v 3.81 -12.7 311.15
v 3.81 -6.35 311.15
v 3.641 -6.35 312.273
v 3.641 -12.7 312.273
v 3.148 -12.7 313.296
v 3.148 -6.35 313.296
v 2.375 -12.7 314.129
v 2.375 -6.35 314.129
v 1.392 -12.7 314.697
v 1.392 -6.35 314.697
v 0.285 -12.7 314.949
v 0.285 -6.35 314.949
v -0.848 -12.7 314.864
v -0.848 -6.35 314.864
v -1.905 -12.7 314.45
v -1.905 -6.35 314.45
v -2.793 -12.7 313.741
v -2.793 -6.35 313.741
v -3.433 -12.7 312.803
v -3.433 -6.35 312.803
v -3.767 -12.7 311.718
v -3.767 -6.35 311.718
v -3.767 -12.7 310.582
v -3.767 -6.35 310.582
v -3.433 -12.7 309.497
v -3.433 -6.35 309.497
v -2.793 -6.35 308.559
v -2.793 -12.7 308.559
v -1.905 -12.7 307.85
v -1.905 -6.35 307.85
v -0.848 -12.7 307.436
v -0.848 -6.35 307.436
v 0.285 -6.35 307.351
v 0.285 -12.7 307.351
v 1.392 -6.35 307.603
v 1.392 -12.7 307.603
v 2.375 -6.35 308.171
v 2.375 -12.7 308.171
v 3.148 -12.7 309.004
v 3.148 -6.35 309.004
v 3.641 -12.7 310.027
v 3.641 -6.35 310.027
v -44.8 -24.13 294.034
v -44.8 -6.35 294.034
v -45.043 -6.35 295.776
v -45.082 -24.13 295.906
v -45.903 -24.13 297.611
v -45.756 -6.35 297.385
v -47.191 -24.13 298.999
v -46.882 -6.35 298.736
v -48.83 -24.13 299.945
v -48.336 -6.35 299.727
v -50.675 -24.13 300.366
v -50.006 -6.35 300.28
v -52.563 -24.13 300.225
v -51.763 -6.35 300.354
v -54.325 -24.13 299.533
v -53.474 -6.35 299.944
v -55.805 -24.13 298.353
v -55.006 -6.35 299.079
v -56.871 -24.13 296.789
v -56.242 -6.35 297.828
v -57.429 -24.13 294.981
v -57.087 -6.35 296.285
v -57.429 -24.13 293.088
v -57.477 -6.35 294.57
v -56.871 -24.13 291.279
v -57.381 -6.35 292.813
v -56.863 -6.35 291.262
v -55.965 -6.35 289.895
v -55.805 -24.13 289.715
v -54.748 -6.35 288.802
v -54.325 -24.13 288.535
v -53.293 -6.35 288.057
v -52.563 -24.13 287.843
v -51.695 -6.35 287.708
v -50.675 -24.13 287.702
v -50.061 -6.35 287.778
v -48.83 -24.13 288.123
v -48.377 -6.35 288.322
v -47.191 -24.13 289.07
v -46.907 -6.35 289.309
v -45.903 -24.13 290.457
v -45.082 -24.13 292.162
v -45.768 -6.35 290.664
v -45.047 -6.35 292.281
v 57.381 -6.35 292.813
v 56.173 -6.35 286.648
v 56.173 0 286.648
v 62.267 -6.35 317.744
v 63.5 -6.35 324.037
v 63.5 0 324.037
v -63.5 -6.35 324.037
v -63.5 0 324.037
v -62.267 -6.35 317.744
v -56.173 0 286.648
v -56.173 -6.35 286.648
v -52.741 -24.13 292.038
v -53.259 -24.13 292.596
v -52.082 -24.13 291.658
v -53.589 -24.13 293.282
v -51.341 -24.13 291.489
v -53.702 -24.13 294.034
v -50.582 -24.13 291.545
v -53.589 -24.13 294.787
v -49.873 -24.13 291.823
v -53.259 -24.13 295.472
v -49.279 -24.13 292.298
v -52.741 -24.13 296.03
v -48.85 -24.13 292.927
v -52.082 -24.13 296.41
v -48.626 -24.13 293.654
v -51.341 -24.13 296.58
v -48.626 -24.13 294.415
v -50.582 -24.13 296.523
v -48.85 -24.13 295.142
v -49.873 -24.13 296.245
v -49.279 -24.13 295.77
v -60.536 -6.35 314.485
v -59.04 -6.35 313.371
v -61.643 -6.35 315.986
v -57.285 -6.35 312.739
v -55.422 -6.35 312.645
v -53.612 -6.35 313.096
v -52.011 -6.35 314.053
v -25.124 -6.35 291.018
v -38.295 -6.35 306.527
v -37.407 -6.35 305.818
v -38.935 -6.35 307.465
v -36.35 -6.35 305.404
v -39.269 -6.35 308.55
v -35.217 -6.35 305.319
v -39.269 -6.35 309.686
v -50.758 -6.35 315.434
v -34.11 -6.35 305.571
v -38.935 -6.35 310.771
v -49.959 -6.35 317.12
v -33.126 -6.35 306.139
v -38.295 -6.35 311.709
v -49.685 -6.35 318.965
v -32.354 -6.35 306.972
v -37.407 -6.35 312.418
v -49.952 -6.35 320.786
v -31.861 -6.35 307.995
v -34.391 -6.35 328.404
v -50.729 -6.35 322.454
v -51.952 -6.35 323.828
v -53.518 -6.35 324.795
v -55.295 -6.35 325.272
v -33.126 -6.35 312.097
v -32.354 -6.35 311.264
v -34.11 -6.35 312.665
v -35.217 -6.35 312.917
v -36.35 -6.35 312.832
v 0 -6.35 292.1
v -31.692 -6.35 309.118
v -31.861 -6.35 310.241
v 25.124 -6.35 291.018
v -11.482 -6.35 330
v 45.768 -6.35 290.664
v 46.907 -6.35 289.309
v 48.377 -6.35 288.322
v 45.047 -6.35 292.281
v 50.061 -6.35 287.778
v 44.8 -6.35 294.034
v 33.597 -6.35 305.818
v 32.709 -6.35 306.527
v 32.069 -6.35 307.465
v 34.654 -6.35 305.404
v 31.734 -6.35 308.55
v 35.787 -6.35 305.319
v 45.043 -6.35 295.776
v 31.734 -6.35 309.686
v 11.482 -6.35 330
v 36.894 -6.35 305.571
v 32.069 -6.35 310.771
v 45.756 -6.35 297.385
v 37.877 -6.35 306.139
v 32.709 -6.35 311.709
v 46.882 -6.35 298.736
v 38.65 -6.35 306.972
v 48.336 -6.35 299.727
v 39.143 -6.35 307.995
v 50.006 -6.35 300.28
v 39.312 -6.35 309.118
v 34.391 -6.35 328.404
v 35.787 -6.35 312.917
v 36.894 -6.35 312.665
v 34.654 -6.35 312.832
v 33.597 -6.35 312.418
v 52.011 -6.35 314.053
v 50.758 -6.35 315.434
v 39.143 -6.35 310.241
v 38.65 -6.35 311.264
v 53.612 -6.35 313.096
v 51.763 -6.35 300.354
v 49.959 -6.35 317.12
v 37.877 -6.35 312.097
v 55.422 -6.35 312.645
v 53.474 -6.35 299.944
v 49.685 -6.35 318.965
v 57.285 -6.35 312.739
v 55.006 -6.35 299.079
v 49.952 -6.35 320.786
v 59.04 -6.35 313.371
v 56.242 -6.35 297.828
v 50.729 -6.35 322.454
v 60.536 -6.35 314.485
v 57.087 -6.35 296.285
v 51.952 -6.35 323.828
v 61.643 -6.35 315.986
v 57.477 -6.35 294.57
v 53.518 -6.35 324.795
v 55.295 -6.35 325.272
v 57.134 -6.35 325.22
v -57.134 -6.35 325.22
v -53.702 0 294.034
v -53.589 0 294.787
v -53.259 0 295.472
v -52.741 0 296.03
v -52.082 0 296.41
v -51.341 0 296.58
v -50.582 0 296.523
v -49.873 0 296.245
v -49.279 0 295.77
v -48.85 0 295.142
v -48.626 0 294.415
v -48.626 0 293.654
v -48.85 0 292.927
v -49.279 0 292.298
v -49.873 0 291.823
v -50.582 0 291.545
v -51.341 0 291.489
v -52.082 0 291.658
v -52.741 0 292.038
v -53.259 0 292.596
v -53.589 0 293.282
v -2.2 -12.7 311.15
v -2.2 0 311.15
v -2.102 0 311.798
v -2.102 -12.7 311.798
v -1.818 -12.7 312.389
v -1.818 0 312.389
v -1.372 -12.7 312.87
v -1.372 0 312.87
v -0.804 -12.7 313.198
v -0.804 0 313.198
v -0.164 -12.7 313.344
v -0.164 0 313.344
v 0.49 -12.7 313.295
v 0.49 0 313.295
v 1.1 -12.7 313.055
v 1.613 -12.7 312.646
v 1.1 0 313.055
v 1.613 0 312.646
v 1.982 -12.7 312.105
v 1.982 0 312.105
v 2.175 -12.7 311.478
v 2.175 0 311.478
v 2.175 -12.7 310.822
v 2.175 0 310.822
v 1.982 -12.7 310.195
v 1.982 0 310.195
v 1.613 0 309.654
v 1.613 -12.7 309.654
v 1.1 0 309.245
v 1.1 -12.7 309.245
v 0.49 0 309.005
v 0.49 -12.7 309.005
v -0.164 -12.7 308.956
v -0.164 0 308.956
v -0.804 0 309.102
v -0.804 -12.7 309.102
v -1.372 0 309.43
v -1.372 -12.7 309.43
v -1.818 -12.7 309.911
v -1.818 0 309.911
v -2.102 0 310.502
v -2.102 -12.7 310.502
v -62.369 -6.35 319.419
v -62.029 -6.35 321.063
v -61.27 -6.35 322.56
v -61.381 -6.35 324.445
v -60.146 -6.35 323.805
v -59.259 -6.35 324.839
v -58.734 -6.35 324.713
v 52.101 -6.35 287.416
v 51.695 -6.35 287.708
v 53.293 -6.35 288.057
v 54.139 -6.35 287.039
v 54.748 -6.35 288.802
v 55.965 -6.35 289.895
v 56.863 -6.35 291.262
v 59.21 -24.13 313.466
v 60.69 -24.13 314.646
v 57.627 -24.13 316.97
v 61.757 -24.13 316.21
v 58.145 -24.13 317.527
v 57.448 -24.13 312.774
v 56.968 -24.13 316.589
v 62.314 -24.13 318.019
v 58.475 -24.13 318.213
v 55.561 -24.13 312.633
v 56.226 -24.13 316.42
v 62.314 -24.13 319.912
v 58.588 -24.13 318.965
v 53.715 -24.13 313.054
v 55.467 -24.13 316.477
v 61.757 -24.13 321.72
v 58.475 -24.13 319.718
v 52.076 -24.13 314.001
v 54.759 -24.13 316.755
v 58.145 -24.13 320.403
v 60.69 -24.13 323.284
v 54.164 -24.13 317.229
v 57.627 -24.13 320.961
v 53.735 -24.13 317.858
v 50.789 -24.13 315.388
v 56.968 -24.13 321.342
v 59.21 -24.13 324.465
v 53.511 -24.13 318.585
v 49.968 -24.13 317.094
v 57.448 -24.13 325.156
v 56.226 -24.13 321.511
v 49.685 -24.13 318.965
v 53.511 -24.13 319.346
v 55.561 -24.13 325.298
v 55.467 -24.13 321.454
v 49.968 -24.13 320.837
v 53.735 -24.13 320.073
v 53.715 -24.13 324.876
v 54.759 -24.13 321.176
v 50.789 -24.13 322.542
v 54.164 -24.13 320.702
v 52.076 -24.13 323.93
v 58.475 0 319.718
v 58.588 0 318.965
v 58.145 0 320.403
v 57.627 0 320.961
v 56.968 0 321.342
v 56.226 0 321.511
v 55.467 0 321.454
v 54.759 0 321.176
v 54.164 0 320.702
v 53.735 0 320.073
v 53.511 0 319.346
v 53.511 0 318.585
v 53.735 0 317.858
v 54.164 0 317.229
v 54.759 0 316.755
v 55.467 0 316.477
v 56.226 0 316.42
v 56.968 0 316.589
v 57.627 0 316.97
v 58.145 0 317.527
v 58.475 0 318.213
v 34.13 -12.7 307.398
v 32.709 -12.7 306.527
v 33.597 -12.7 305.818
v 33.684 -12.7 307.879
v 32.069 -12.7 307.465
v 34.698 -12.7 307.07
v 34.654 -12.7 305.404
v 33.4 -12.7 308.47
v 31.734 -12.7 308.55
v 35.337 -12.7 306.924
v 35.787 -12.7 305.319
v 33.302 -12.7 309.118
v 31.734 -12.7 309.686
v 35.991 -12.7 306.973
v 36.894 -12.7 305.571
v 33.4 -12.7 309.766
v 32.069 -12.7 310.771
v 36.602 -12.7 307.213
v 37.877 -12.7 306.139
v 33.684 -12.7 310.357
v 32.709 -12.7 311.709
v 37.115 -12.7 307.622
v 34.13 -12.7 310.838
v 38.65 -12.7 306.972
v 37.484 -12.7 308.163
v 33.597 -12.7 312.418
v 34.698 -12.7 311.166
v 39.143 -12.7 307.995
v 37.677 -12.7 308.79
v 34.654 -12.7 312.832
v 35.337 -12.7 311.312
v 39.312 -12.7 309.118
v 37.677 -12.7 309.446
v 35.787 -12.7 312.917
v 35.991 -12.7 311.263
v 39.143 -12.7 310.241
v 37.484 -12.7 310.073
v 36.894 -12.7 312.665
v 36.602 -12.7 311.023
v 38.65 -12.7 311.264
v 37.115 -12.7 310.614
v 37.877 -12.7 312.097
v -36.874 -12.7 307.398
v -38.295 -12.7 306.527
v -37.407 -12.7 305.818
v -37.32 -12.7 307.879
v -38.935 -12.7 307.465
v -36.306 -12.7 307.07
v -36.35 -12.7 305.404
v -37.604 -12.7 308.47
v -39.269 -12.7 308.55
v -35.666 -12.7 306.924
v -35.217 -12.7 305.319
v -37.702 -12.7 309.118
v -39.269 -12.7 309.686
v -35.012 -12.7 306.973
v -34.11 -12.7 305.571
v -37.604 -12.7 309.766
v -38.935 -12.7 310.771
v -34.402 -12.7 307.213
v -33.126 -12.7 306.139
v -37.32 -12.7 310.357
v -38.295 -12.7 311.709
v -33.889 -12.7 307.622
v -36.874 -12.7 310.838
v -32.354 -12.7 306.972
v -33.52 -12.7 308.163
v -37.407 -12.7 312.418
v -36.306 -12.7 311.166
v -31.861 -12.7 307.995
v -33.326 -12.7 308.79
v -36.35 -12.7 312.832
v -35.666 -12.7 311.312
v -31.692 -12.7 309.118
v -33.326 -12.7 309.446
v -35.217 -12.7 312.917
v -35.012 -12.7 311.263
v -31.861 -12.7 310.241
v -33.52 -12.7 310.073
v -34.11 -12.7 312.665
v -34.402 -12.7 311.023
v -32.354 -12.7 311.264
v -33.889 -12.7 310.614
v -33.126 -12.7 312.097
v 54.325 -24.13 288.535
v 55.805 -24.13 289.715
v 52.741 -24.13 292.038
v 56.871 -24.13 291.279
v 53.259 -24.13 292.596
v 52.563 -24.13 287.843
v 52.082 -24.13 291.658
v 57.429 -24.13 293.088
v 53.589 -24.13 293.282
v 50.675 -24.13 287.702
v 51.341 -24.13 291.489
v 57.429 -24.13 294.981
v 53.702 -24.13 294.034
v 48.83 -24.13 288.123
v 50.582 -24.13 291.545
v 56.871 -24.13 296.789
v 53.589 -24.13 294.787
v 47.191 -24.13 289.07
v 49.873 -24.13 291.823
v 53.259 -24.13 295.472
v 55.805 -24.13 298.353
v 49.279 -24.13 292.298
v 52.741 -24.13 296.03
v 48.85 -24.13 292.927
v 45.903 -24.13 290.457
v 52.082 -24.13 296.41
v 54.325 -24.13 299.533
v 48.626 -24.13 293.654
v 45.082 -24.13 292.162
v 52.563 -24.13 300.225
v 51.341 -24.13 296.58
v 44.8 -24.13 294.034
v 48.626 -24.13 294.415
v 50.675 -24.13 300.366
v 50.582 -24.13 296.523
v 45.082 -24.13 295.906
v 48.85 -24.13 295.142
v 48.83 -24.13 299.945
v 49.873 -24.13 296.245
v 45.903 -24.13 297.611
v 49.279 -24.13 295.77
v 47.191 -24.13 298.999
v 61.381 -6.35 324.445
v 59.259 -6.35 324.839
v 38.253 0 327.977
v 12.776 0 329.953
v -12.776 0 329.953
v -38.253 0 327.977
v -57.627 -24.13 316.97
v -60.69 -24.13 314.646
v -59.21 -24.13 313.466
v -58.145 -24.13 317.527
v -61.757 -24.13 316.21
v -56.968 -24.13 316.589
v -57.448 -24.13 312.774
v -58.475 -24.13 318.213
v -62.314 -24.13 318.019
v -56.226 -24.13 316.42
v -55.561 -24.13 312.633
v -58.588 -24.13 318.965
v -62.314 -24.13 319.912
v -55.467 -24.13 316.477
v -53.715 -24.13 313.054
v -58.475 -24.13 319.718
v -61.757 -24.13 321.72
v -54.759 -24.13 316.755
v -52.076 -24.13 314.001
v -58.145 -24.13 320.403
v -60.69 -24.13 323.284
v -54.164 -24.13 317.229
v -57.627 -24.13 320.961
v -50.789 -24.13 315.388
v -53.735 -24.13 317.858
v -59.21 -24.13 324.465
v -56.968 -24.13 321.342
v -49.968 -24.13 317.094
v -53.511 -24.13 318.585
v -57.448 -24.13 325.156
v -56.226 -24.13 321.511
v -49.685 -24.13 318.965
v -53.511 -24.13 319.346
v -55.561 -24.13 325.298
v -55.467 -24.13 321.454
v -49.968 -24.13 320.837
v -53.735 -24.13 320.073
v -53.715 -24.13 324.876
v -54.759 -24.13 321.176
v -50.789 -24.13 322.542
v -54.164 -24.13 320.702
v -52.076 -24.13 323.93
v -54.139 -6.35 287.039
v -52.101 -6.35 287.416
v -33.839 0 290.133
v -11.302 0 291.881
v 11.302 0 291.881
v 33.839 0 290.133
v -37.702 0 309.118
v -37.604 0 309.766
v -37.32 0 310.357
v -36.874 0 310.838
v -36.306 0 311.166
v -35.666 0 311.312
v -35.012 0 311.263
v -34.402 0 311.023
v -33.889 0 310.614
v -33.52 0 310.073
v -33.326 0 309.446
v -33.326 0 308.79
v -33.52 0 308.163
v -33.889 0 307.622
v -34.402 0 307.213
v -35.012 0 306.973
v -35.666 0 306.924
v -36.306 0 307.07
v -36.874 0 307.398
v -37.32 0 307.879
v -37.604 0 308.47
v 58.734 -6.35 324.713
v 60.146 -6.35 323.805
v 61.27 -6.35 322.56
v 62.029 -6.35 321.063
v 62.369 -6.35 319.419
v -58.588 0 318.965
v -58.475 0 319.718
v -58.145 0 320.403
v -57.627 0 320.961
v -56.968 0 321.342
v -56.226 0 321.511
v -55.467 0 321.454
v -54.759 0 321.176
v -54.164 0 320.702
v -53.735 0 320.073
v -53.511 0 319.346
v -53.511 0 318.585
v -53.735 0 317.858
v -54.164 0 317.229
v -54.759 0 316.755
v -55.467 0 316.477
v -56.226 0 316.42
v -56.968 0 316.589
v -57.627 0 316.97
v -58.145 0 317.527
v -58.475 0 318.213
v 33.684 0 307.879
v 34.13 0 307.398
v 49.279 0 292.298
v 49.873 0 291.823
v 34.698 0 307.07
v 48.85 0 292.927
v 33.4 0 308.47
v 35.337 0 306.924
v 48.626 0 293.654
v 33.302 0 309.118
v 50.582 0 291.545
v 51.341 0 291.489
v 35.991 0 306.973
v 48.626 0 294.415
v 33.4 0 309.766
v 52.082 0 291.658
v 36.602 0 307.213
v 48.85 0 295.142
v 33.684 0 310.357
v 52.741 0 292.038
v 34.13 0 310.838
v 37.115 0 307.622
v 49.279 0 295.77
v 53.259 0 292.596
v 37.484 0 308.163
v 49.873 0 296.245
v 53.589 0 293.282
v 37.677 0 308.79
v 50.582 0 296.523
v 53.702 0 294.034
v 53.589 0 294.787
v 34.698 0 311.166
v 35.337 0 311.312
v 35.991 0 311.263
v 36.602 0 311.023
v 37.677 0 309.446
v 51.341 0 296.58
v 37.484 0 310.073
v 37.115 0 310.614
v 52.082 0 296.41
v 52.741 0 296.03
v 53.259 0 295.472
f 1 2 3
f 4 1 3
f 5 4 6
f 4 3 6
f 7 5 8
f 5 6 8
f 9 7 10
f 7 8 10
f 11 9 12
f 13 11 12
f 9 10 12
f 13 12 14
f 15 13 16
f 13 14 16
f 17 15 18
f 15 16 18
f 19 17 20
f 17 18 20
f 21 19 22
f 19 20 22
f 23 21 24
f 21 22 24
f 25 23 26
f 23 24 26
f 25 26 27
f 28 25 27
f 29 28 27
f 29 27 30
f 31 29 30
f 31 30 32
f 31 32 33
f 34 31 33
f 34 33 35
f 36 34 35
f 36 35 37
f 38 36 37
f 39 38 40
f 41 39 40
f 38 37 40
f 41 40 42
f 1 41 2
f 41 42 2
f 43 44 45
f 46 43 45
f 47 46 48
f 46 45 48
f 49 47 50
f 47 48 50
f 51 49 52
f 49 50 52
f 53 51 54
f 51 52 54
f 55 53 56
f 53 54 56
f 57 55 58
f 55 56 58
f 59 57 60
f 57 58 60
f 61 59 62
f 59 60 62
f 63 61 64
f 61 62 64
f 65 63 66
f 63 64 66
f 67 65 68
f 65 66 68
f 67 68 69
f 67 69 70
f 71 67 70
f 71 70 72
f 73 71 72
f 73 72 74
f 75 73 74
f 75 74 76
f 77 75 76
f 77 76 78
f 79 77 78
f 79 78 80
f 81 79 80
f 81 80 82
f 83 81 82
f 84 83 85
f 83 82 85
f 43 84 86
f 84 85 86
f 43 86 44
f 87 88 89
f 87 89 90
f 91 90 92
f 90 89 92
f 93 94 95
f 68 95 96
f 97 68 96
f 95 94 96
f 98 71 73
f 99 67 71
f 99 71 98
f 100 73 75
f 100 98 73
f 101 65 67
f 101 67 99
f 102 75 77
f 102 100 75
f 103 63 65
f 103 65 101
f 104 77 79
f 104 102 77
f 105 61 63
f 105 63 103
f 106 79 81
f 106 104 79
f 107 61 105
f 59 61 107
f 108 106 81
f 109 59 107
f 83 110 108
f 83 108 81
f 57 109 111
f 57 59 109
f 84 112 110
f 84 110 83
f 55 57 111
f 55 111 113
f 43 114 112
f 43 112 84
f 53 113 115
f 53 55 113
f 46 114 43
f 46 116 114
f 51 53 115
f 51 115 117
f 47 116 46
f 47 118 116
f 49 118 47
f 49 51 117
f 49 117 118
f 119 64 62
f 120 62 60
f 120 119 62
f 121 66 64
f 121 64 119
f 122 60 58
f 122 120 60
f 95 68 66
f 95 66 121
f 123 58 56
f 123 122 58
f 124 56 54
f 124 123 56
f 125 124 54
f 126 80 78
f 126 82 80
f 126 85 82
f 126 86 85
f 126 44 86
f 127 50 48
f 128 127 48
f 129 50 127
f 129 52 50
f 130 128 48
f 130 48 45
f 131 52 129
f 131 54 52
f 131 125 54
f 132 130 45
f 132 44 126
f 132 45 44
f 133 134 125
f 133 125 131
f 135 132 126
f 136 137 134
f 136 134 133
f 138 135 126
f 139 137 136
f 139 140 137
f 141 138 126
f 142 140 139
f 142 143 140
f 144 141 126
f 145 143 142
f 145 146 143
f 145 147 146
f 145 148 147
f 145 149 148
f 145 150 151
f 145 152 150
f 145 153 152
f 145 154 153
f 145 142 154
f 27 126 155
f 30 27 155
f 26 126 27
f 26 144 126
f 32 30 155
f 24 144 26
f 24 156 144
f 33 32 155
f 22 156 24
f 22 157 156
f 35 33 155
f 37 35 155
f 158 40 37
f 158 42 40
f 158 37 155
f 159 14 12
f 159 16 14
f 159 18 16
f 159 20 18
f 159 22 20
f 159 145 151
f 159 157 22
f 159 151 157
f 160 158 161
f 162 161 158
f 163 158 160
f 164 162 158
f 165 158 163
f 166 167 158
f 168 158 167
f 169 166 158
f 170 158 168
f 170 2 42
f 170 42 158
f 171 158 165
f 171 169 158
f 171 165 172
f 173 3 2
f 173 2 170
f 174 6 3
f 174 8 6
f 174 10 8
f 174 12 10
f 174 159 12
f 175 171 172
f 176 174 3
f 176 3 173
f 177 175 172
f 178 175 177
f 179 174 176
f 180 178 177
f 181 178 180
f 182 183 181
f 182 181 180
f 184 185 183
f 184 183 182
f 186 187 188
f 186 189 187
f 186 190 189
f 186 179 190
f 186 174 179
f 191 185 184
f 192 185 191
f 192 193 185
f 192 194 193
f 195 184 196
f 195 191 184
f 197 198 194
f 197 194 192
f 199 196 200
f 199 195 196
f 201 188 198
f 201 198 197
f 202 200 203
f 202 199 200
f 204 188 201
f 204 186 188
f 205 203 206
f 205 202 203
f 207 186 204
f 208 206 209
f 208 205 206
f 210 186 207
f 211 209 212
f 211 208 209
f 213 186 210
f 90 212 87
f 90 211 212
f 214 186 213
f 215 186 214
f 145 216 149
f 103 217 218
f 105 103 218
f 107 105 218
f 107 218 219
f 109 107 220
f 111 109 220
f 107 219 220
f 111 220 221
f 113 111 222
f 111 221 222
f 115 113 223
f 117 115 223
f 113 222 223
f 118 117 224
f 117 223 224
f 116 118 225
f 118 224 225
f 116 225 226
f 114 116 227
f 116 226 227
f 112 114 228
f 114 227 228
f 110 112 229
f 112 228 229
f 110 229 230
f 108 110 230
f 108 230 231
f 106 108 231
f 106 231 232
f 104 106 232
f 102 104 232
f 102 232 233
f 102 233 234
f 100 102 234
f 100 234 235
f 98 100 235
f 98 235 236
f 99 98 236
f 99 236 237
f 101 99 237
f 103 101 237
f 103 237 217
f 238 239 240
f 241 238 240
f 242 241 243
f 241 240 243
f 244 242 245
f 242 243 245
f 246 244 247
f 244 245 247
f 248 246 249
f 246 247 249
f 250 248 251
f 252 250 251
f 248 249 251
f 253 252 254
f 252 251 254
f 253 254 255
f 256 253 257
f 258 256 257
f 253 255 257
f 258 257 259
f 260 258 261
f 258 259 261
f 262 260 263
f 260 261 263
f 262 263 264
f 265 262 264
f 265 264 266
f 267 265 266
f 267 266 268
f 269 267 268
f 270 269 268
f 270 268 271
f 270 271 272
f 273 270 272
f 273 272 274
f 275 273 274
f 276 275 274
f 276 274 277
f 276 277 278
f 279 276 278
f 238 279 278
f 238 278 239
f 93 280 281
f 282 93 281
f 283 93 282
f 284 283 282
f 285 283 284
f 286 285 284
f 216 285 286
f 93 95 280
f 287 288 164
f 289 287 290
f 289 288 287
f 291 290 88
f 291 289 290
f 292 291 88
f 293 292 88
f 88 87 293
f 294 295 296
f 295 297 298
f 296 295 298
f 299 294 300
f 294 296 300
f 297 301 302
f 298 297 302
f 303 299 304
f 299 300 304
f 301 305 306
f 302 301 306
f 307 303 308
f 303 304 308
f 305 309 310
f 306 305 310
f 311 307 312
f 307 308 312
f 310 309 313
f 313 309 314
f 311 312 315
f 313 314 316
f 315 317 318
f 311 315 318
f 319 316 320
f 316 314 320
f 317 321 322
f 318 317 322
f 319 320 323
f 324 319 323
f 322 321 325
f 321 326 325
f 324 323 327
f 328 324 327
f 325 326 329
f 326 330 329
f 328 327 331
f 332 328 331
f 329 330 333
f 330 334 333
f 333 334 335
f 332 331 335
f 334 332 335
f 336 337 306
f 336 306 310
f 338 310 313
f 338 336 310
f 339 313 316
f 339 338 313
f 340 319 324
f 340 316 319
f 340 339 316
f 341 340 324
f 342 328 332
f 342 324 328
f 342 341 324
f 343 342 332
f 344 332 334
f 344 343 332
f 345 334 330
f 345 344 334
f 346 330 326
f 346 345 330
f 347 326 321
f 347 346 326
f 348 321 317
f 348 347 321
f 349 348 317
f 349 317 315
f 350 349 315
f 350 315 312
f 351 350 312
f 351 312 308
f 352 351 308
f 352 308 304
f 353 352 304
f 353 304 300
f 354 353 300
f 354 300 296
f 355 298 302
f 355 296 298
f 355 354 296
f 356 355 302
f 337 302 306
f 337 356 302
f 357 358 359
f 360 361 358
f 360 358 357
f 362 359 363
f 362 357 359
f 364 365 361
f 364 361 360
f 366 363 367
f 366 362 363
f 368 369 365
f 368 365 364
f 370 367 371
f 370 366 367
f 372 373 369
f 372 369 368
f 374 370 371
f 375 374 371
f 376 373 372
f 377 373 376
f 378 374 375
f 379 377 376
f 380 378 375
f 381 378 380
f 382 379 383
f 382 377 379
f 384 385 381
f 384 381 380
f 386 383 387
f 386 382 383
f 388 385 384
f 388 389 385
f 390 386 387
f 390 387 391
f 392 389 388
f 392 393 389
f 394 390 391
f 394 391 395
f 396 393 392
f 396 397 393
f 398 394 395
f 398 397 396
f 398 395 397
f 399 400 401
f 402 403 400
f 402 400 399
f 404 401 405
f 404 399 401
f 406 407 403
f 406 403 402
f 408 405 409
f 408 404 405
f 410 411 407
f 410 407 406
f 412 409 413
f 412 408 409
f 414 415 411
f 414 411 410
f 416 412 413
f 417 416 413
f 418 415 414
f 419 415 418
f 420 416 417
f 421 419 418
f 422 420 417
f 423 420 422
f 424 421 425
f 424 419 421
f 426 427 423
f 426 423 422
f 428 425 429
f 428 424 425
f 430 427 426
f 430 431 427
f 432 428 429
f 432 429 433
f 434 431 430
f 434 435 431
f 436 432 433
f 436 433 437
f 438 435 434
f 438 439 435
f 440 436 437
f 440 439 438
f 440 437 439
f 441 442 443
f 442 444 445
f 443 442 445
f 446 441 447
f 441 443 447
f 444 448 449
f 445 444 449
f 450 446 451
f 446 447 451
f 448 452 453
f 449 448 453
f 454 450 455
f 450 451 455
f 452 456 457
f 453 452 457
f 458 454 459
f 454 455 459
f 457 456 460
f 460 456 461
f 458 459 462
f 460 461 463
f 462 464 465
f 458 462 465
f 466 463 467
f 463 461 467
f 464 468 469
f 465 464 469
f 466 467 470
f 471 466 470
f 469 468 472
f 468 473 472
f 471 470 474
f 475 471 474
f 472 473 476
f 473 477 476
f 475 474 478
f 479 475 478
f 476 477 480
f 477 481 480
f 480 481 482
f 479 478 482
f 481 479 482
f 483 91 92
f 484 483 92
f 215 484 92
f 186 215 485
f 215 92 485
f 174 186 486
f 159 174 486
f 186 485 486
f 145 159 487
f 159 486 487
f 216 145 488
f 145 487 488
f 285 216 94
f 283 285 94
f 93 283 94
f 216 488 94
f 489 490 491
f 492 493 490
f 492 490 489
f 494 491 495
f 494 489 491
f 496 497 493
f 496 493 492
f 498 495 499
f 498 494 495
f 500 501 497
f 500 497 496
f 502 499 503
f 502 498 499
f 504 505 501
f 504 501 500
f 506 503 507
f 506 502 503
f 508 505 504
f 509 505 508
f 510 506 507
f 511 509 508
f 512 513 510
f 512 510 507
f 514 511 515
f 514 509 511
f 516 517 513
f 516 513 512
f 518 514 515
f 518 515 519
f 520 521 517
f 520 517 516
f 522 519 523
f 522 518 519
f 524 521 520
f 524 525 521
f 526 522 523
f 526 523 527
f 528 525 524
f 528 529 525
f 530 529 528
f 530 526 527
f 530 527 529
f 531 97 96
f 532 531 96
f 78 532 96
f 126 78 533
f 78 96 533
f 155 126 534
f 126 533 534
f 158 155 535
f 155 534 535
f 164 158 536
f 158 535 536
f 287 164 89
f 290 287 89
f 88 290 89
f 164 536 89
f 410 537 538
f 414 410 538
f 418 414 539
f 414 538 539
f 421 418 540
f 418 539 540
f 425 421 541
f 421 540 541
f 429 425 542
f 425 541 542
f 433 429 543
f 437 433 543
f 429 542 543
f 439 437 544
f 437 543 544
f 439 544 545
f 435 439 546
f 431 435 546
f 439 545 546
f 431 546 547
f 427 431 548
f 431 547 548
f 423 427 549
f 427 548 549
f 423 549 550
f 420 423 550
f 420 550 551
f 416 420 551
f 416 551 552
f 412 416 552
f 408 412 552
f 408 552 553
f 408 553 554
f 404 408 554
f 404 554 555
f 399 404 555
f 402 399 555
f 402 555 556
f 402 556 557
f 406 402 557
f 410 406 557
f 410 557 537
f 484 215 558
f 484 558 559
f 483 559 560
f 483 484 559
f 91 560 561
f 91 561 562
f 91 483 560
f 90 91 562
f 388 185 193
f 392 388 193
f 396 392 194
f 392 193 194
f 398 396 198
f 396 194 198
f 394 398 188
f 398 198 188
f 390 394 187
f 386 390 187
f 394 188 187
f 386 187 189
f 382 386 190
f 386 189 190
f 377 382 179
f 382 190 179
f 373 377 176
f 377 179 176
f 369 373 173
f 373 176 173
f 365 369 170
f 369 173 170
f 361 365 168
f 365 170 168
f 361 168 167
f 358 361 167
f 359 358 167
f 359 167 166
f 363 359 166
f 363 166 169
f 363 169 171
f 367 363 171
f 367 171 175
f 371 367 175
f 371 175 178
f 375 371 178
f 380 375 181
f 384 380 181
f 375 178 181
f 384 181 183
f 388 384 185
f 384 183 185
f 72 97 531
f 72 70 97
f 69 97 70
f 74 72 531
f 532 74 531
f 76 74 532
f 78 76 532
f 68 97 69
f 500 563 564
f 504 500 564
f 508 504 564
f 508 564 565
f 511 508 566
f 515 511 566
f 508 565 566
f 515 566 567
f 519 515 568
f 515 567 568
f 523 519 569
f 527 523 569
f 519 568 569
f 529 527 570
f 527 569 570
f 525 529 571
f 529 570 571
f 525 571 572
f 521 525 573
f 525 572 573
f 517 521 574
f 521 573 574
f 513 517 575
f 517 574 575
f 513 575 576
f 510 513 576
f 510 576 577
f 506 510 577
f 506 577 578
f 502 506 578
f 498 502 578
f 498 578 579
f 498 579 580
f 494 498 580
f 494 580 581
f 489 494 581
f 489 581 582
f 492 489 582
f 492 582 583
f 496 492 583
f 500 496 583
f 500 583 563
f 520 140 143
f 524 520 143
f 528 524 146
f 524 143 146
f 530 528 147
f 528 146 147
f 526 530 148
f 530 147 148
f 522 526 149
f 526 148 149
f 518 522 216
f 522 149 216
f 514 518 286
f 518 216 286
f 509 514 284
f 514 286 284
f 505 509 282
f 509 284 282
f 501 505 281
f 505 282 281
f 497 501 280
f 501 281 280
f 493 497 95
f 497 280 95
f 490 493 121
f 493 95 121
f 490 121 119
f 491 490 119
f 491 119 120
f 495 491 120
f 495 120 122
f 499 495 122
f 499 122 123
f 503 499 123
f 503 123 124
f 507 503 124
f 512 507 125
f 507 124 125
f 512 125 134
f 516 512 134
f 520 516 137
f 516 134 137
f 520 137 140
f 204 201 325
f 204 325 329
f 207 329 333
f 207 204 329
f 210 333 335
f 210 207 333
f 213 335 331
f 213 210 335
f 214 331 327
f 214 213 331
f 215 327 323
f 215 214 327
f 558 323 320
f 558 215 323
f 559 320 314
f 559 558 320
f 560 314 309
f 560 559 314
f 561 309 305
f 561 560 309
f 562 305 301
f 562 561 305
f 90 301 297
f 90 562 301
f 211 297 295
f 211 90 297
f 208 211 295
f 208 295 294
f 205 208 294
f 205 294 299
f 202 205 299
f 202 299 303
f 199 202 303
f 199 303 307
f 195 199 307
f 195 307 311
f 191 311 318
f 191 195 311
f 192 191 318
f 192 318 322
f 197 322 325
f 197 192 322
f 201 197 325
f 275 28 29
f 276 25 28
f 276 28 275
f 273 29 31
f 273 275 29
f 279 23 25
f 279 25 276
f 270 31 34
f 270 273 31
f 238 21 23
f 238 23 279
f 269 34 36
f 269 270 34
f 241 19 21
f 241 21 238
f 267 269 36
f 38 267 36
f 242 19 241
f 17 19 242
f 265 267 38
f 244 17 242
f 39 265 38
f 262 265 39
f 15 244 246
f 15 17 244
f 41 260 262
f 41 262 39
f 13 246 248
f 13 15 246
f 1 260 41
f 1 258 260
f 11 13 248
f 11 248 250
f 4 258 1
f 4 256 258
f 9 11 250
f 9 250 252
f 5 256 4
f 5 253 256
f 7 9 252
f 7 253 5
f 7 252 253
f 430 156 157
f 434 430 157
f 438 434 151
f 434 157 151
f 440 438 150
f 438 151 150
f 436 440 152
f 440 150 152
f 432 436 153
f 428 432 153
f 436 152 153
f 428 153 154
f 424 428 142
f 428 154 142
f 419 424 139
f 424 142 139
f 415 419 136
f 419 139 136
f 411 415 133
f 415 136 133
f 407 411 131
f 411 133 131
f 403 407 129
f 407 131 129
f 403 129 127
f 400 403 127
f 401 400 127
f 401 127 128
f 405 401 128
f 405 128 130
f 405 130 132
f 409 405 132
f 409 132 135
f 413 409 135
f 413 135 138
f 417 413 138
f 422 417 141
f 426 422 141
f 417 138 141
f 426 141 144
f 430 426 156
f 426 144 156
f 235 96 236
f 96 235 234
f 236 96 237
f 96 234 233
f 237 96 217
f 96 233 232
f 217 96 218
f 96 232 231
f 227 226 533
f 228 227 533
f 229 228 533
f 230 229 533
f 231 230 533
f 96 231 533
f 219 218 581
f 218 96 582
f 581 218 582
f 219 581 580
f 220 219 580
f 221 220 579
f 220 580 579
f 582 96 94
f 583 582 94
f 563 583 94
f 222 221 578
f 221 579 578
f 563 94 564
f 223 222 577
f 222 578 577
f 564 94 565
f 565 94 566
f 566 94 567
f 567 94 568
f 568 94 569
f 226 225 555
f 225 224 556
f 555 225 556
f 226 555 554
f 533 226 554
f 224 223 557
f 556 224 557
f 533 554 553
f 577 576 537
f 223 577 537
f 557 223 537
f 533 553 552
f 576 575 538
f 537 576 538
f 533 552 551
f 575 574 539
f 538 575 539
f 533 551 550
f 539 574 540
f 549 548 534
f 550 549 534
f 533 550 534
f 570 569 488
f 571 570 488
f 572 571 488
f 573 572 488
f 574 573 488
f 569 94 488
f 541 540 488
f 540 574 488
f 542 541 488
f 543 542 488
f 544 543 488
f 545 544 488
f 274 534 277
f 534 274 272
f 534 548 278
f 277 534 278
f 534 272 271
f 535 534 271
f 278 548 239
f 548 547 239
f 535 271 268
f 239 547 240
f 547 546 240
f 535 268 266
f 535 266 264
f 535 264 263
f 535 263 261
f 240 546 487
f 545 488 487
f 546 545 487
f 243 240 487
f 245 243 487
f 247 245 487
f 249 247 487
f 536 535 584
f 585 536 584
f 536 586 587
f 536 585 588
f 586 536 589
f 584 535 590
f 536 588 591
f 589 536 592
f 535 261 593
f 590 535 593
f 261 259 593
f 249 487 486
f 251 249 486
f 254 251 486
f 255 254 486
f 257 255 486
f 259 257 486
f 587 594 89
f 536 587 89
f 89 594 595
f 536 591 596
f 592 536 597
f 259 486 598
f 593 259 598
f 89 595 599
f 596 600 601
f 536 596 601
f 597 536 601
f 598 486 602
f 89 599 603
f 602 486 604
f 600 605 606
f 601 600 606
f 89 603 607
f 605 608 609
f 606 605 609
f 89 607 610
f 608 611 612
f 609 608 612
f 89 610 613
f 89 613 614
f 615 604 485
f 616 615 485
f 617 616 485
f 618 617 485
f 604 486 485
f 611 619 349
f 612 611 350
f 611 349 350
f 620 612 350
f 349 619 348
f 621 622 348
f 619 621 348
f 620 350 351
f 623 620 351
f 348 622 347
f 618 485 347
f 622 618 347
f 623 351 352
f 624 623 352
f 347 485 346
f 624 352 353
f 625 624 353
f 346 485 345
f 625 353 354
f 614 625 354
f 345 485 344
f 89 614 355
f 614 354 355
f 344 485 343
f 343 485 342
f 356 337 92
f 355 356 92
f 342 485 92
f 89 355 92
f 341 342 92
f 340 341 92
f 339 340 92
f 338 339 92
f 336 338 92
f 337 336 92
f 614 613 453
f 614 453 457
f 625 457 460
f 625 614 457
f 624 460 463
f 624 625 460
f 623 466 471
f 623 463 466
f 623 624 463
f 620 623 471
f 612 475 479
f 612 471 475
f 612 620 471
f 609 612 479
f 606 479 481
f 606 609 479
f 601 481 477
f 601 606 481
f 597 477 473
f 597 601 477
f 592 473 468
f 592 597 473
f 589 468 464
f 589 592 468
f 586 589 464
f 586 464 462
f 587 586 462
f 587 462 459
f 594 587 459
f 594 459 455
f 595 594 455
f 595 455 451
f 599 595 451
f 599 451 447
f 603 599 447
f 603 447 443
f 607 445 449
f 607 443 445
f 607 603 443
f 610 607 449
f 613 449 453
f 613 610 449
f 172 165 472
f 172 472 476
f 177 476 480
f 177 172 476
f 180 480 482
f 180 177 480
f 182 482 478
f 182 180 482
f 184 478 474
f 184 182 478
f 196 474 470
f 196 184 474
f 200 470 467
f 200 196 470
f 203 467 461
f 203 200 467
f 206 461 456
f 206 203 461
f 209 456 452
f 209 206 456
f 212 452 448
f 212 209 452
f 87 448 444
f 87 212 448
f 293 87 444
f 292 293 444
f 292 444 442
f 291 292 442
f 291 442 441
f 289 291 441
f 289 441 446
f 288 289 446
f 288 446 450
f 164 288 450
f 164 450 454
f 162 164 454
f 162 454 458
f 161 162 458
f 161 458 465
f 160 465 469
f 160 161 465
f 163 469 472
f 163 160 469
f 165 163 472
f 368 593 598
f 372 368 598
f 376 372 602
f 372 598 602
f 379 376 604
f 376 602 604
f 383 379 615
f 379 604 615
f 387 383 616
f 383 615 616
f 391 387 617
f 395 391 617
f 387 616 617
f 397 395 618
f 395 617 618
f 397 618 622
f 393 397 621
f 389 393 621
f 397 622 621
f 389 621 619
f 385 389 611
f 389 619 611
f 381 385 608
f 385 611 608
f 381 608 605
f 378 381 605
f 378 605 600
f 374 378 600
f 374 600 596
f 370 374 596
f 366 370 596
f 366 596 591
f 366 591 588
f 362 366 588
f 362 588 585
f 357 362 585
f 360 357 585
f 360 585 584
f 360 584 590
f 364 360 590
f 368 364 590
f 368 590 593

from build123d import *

# Parameters (mm, degrees)
F1_DEPTH = 6.35
F2_R     = 6.35
F3_DEPTH = 17.78
F5_D     = 5.1054
F6_R     = 3.81
F7_DEPTH = 6.35
F9_D     = 4.4


# Not quite as in the source:
# - a pattern or mirror of a feature is missing from the dataset's text; its kind, count and spacing are read off the source's solid


with BuildPart() as f1:
    # F0 (on Front) → F1 (new body)
    with BuildSketch(Plane.XZ):
        with BuildLine():
            Line((56.1730769231, 286.6478596274), (63.5, 324.0367108832))
            ThreePointArc((63.5, 324.0367108832), (0, 330.2), (-63.5, 324.0367108832))
            Line((-63.5, 324.0367108832), (-56.1730769231, 286.6478596274))
            ThreePointArc((-56.1730769231, 286.6478596274), (0, 292.1), (56.1730769231, 286.6478596274))
        make_face()
    extrude(amount=F1_DEPTH)

    # F2 (on face) → F3 (join)
    with BuildSketch(Plane.XZ.offset(6.35)):
        with Locations((-51.149763091, 294.0341888892)):
            Circle(F2_R)
        with Locations((-56.0353976971, 318.9652907527)):
            Circle(F2_R)
    f3 = extrude(amount=F3_DEPTH)

    # F3_copies: F3 across plane
    add(f3.mirror(Plane(origin=(0, 0, 0), x_dir=(0, 0, 1), z_dir=(1, 0, 0))))

    # F5 (through all)
    with Locations(Plane.XZ.offset(24.13)):
        with Locations((-56.0353976971, 318.9652907527), (-51.149763091, 294.0341888892)):
            f5 = Hole(F5_D / 2)

    # F5_copies: F5 across plane
    add(f5.mirror(Plane(origin=(0, 0, 0), x_dir=(0, 0, 1), z_dir=(1, 0, 0))), mode=Mode.SUBTRACT)

    # F6 (on face) → F7 (join)
    with BuildSketch(Plane.XZ.offset(6.35)):
        with Locations((0, 311.15)):
            Circle(F6_R)
        with Locations((-35.501895386, 309.118)):
            Circle(F6_R)
        with Locations((35.501895386, 309.118)):
            Circle(F6_R)
    extrude(amount=F7_DEPTH)

    # F9 (through all)
    with Locations(Plane.XZ.offset(12.7)):
        with Locations((-35.501895386, 309.118), (0, 311.15), (35.501895386, 309.118)):
            Hole(F9_D / 2)


solid = f1.part
